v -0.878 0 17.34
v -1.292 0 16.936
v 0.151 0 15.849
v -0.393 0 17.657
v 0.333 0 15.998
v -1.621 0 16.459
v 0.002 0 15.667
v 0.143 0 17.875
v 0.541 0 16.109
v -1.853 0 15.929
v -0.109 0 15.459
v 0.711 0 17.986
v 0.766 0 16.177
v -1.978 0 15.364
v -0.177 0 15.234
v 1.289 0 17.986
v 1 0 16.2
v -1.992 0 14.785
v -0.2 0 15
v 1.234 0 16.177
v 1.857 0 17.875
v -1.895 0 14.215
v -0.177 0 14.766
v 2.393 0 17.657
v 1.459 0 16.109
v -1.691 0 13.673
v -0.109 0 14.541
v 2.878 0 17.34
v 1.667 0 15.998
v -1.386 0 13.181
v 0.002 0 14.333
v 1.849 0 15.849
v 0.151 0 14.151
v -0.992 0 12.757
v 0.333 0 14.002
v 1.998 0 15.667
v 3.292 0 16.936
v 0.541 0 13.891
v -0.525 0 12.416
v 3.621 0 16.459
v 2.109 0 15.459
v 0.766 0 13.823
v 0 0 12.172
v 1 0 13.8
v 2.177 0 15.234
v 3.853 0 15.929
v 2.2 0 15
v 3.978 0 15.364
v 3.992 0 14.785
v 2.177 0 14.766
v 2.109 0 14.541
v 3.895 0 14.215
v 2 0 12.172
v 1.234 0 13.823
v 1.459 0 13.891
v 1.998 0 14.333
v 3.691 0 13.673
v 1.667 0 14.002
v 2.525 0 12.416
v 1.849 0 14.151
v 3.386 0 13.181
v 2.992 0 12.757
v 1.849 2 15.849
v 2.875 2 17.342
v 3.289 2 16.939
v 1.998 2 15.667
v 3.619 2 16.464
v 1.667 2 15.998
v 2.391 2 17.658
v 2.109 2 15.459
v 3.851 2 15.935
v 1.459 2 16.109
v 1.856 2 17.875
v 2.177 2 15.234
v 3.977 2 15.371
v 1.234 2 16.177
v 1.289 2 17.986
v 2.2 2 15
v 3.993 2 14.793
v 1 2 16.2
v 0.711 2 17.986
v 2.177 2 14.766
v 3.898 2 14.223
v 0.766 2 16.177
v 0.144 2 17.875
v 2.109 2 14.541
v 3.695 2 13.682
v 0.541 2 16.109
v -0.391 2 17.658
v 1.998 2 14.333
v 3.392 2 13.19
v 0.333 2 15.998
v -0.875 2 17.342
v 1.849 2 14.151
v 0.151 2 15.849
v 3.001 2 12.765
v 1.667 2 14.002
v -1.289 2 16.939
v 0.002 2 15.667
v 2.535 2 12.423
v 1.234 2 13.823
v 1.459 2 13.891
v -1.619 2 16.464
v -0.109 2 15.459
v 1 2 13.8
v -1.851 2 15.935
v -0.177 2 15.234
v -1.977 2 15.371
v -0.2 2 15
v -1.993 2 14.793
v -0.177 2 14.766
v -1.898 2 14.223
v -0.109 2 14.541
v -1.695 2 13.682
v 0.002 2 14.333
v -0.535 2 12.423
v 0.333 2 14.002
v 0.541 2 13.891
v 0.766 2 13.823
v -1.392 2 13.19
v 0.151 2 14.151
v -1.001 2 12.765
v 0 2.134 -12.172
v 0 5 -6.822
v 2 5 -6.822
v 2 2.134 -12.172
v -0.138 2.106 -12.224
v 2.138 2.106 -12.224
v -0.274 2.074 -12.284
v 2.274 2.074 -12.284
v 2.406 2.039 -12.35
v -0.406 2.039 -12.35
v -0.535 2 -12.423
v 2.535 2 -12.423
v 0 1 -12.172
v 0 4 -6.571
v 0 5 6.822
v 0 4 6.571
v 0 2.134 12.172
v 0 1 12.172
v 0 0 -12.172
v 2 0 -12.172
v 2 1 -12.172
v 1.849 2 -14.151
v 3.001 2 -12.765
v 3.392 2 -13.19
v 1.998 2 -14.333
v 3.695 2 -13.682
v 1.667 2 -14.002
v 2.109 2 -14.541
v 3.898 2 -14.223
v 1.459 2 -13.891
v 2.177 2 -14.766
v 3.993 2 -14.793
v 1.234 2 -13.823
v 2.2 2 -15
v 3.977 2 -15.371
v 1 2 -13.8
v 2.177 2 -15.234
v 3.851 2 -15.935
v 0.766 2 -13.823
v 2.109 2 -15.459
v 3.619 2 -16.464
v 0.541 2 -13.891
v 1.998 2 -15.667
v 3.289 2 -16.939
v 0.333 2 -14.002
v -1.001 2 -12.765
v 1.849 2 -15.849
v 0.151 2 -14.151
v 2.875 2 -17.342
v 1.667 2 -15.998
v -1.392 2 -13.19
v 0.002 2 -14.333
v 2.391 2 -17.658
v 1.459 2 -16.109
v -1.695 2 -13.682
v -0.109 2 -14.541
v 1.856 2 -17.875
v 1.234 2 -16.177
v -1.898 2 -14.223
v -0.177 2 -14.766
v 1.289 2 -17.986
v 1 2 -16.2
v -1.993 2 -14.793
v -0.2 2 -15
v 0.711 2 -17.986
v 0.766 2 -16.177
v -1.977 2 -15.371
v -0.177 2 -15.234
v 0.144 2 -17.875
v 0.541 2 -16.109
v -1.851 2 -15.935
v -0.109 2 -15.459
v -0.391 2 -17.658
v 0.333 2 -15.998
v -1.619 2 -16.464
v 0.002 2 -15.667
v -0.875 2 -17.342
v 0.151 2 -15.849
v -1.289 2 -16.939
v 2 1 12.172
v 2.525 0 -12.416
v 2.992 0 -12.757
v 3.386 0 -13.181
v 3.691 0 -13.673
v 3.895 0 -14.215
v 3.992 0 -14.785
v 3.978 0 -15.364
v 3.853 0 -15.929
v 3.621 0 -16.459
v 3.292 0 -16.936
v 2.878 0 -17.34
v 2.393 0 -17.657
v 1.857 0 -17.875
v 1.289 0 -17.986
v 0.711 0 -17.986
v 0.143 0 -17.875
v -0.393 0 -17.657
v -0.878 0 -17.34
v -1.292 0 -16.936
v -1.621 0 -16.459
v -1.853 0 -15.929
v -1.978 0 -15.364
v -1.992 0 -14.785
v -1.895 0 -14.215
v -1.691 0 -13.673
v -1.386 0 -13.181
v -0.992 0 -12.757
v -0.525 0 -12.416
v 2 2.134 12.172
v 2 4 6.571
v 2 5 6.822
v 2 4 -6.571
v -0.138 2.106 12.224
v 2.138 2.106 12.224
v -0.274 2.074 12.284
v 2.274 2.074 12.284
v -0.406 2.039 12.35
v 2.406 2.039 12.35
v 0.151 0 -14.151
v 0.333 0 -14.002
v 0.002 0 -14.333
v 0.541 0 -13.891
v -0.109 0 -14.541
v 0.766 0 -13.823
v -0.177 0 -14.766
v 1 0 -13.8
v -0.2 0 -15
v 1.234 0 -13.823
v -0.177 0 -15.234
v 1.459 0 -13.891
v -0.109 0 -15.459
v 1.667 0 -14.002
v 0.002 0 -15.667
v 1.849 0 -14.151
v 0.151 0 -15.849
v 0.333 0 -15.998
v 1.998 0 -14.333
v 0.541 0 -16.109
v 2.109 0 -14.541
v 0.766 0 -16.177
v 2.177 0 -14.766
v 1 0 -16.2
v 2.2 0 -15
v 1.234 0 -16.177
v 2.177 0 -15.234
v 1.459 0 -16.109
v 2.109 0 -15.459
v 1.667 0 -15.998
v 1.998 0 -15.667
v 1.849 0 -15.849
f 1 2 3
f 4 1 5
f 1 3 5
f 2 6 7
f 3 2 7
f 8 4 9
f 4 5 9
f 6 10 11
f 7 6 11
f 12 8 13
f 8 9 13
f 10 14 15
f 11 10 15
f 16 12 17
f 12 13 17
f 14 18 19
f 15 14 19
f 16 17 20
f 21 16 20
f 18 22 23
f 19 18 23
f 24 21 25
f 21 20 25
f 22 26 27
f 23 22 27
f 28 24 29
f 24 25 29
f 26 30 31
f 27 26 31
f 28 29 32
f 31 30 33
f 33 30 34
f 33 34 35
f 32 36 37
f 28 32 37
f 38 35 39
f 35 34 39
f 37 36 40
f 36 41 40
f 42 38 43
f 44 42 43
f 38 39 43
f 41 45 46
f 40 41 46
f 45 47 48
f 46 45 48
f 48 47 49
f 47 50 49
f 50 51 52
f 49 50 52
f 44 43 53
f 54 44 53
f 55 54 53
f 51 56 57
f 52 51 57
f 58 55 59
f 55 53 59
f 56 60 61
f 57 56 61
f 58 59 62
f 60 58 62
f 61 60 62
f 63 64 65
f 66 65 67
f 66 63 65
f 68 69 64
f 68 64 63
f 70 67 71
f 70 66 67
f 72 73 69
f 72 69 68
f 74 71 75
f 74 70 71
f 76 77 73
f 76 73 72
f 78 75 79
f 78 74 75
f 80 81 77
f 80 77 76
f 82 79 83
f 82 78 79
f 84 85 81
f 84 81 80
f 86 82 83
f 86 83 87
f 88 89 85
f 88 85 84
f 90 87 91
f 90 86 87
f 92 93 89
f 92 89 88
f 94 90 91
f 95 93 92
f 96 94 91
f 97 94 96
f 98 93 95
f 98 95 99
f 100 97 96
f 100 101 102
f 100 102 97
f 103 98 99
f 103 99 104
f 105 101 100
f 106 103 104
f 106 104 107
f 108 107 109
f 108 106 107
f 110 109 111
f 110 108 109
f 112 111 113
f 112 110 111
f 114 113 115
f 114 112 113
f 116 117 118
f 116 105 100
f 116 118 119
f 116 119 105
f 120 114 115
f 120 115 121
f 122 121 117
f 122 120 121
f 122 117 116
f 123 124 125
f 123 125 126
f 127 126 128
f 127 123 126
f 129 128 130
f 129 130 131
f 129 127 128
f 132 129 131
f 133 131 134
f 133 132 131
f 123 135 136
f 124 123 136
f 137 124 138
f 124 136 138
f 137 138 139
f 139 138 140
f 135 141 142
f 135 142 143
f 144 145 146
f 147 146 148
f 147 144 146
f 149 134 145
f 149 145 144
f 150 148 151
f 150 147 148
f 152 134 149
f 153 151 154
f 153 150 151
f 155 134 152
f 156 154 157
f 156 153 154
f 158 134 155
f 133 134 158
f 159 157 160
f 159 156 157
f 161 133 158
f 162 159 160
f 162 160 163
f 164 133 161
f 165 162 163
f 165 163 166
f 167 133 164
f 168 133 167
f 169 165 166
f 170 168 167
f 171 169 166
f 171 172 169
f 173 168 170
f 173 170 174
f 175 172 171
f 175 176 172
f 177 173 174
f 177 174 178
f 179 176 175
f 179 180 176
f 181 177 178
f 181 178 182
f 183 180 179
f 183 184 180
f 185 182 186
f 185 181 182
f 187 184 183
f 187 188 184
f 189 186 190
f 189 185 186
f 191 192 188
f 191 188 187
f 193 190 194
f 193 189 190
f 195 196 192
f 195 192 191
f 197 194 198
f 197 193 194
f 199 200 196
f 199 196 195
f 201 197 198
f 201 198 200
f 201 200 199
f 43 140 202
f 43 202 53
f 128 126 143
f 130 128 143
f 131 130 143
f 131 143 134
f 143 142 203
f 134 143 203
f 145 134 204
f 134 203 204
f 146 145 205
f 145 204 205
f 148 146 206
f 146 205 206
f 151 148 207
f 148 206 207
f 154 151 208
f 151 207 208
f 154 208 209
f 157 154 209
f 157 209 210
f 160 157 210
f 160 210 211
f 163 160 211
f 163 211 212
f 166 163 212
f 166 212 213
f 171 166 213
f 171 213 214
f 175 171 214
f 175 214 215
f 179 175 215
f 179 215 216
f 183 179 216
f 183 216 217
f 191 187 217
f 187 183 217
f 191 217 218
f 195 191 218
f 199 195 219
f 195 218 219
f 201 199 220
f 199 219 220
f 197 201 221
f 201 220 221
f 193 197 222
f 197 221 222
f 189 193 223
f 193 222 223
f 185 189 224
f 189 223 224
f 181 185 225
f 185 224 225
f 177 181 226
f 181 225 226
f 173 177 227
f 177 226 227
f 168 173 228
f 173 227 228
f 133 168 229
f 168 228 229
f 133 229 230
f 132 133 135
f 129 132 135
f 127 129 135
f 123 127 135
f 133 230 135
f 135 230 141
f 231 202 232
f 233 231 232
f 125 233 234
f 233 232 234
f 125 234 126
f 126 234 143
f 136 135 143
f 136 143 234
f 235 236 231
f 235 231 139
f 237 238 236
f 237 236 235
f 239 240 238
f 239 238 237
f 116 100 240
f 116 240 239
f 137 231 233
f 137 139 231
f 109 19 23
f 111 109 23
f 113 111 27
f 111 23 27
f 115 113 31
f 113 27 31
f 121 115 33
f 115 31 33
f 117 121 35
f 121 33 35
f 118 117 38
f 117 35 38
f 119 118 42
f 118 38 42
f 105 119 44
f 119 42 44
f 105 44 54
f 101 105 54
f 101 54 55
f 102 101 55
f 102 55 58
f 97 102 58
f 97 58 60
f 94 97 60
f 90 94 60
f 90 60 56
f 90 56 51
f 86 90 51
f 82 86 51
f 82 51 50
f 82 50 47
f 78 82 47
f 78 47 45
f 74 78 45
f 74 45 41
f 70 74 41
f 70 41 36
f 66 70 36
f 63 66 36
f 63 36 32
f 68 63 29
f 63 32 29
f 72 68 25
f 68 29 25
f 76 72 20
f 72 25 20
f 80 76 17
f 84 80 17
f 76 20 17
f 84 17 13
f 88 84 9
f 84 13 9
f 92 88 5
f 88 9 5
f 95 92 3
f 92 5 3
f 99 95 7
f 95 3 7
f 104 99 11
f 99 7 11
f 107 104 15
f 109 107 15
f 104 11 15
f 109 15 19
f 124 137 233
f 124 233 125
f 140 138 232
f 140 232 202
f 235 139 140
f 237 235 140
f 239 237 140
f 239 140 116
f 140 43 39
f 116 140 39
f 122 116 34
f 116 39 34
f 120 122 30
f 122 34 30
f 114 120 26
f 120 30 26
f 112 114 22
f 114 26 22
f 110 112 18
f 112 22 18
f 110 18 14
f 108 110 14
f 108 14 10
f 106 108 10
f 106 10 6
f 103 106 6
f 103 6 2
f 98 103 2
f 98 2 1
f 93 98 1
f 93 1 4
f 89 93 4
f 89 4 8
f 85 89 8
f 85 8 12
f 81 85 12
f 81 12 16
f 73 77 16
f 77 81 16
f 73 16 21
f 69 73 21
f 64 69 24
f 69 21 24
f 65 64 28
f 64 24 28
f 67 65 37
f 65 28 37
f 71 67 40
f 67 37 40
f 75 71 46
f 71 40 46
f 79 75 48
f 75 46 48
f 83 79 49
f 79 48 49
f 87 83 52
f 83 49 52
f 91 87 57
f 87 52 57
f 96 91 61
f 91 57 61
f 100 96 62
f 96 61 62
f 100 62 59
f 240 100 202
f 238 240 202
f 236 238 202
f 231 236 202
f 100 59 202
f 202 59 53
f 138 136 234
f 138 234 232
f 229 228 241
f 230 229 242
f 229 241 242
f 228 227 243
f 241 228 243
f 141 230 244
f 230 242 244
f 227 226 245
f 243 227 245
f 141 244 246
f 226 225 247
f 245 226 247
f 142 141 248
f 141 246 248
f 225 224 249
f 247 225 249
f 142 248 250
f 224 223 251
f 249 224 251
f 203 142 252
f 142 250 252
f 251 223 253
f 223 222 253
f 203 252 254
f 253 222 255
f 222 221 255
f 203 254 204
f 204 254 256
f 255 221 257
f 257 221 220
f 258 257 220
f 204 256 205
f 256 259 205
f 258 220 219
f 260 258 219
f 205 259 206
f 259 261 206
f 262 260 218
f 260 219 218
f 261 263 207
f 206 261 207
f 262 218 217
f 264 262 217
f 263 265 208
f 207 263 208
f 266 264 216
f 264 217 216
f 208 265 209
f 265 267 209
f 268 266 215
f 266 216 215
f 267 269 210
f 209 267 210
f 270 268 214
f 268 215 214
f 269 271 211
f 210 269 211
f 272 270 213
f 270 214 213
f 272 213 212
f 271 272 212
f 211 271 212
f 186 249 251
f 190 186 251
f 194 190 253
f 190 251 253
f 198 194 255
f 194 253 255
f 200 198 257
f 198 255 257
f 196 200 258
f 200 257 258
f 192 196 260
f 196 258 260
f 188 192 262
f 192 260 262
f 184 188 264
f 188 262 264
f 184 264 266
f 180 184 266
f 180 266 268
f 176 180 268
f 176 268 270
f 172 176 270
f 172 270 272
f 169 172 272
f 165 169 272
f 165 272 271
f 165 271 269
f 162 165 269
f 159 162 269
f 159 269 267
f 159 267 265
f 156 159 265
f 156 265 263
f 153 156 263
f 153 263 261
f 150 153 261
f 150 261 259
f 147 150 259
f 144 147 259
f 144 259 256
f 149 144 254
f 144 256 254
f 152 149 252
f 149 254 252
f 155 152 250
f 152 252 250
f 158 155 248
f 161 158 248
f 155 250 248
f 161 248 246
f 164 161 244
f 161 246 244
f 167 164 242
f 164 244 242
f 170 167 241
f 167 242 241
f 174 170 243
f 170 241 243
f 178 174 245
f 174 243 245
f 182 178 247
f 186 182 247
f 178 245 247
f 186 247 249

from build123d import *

# Parameters (mm, degrees)
BOSS_EXTRUDE1_DEPTH     = 10
CUT_EXTRUDE1_DEPTH      = 21.976176963
CUT_EXTRUDE1_DEPTH_BACK = 10
SKETCH2_OUTSIDE_W       = 45.568
SKETCH2_OUTSIDE_H       = 19.568
M2_CLEARANCE_HOLE1_D    = 2.4


with BuildPart() as part:
    # Sketch1 → Boss-Extrude1 (new body)
    with BuildSketch(Plane(origin=(0, 0, 0), x_dir=(1, 0, 0), z_dir=(0, 1, 0))):
        with BuildLine():
            Line((2, -12.171572875), (2, 12.171572875))
            ThreePointArc((2, 12.171572875), (1, 18), (0, 12.171572875))
            Line((0, 12.171572875), (0, -12.171572875))
            ThreePointArc((0, -12.171572875), (1, -18), (2, -12.171572875))
        make_face()
    extrude(amount=BOSS_EXTRUDE1_DEPTH)

    # Sketch2 outside → Cut-Extrude1 (cut, two sides: drawn at the far end of the back side and taken through both)
    with BuildSketch(Plane(origin=(2, 0, 0), x_dir=(0, 0, -1), z_dir=(1, 0, 0)).offset(-CUT_EXTRUDE1_DEPTH_BACK)):
        with Locations((0, 5)):
            Rectangle(SKETCH2_OUTSIDE_W, SKETCH2_OUTSIDE_H)
        Polygon((6.57130649, 4), (-6.57130649, 4), (-12.171572875, 1), (-12.171572875, 0), (-18, 0), (-18, 2), (-12.422546375, 2), (-6.822279989, 5), (6.822279989, 5), (12.422546375, 2), (18, 2), (18, 0), (12.171572875, 0), (12.171572875, 1), align=None, mode=Mode.SUBTRACT)
    extrude(amount=CUT_EXTRUDE1_DEPTH + CUT_EXTRUDE1_DEPTH_BACK, mode=Mode.SUBTRACT)

    # M2 Clearance Hole1 (through all)
    with Locations(Plane(origin=(0, 2, 0), x_dir=(1, 0, 0), z_dir=(0, 1, 0))):
        with Locations((1, 15), (1, -15)):
            Hole(M2_CLEARANCE_HOLE1_D / 2)


solid = part.part
